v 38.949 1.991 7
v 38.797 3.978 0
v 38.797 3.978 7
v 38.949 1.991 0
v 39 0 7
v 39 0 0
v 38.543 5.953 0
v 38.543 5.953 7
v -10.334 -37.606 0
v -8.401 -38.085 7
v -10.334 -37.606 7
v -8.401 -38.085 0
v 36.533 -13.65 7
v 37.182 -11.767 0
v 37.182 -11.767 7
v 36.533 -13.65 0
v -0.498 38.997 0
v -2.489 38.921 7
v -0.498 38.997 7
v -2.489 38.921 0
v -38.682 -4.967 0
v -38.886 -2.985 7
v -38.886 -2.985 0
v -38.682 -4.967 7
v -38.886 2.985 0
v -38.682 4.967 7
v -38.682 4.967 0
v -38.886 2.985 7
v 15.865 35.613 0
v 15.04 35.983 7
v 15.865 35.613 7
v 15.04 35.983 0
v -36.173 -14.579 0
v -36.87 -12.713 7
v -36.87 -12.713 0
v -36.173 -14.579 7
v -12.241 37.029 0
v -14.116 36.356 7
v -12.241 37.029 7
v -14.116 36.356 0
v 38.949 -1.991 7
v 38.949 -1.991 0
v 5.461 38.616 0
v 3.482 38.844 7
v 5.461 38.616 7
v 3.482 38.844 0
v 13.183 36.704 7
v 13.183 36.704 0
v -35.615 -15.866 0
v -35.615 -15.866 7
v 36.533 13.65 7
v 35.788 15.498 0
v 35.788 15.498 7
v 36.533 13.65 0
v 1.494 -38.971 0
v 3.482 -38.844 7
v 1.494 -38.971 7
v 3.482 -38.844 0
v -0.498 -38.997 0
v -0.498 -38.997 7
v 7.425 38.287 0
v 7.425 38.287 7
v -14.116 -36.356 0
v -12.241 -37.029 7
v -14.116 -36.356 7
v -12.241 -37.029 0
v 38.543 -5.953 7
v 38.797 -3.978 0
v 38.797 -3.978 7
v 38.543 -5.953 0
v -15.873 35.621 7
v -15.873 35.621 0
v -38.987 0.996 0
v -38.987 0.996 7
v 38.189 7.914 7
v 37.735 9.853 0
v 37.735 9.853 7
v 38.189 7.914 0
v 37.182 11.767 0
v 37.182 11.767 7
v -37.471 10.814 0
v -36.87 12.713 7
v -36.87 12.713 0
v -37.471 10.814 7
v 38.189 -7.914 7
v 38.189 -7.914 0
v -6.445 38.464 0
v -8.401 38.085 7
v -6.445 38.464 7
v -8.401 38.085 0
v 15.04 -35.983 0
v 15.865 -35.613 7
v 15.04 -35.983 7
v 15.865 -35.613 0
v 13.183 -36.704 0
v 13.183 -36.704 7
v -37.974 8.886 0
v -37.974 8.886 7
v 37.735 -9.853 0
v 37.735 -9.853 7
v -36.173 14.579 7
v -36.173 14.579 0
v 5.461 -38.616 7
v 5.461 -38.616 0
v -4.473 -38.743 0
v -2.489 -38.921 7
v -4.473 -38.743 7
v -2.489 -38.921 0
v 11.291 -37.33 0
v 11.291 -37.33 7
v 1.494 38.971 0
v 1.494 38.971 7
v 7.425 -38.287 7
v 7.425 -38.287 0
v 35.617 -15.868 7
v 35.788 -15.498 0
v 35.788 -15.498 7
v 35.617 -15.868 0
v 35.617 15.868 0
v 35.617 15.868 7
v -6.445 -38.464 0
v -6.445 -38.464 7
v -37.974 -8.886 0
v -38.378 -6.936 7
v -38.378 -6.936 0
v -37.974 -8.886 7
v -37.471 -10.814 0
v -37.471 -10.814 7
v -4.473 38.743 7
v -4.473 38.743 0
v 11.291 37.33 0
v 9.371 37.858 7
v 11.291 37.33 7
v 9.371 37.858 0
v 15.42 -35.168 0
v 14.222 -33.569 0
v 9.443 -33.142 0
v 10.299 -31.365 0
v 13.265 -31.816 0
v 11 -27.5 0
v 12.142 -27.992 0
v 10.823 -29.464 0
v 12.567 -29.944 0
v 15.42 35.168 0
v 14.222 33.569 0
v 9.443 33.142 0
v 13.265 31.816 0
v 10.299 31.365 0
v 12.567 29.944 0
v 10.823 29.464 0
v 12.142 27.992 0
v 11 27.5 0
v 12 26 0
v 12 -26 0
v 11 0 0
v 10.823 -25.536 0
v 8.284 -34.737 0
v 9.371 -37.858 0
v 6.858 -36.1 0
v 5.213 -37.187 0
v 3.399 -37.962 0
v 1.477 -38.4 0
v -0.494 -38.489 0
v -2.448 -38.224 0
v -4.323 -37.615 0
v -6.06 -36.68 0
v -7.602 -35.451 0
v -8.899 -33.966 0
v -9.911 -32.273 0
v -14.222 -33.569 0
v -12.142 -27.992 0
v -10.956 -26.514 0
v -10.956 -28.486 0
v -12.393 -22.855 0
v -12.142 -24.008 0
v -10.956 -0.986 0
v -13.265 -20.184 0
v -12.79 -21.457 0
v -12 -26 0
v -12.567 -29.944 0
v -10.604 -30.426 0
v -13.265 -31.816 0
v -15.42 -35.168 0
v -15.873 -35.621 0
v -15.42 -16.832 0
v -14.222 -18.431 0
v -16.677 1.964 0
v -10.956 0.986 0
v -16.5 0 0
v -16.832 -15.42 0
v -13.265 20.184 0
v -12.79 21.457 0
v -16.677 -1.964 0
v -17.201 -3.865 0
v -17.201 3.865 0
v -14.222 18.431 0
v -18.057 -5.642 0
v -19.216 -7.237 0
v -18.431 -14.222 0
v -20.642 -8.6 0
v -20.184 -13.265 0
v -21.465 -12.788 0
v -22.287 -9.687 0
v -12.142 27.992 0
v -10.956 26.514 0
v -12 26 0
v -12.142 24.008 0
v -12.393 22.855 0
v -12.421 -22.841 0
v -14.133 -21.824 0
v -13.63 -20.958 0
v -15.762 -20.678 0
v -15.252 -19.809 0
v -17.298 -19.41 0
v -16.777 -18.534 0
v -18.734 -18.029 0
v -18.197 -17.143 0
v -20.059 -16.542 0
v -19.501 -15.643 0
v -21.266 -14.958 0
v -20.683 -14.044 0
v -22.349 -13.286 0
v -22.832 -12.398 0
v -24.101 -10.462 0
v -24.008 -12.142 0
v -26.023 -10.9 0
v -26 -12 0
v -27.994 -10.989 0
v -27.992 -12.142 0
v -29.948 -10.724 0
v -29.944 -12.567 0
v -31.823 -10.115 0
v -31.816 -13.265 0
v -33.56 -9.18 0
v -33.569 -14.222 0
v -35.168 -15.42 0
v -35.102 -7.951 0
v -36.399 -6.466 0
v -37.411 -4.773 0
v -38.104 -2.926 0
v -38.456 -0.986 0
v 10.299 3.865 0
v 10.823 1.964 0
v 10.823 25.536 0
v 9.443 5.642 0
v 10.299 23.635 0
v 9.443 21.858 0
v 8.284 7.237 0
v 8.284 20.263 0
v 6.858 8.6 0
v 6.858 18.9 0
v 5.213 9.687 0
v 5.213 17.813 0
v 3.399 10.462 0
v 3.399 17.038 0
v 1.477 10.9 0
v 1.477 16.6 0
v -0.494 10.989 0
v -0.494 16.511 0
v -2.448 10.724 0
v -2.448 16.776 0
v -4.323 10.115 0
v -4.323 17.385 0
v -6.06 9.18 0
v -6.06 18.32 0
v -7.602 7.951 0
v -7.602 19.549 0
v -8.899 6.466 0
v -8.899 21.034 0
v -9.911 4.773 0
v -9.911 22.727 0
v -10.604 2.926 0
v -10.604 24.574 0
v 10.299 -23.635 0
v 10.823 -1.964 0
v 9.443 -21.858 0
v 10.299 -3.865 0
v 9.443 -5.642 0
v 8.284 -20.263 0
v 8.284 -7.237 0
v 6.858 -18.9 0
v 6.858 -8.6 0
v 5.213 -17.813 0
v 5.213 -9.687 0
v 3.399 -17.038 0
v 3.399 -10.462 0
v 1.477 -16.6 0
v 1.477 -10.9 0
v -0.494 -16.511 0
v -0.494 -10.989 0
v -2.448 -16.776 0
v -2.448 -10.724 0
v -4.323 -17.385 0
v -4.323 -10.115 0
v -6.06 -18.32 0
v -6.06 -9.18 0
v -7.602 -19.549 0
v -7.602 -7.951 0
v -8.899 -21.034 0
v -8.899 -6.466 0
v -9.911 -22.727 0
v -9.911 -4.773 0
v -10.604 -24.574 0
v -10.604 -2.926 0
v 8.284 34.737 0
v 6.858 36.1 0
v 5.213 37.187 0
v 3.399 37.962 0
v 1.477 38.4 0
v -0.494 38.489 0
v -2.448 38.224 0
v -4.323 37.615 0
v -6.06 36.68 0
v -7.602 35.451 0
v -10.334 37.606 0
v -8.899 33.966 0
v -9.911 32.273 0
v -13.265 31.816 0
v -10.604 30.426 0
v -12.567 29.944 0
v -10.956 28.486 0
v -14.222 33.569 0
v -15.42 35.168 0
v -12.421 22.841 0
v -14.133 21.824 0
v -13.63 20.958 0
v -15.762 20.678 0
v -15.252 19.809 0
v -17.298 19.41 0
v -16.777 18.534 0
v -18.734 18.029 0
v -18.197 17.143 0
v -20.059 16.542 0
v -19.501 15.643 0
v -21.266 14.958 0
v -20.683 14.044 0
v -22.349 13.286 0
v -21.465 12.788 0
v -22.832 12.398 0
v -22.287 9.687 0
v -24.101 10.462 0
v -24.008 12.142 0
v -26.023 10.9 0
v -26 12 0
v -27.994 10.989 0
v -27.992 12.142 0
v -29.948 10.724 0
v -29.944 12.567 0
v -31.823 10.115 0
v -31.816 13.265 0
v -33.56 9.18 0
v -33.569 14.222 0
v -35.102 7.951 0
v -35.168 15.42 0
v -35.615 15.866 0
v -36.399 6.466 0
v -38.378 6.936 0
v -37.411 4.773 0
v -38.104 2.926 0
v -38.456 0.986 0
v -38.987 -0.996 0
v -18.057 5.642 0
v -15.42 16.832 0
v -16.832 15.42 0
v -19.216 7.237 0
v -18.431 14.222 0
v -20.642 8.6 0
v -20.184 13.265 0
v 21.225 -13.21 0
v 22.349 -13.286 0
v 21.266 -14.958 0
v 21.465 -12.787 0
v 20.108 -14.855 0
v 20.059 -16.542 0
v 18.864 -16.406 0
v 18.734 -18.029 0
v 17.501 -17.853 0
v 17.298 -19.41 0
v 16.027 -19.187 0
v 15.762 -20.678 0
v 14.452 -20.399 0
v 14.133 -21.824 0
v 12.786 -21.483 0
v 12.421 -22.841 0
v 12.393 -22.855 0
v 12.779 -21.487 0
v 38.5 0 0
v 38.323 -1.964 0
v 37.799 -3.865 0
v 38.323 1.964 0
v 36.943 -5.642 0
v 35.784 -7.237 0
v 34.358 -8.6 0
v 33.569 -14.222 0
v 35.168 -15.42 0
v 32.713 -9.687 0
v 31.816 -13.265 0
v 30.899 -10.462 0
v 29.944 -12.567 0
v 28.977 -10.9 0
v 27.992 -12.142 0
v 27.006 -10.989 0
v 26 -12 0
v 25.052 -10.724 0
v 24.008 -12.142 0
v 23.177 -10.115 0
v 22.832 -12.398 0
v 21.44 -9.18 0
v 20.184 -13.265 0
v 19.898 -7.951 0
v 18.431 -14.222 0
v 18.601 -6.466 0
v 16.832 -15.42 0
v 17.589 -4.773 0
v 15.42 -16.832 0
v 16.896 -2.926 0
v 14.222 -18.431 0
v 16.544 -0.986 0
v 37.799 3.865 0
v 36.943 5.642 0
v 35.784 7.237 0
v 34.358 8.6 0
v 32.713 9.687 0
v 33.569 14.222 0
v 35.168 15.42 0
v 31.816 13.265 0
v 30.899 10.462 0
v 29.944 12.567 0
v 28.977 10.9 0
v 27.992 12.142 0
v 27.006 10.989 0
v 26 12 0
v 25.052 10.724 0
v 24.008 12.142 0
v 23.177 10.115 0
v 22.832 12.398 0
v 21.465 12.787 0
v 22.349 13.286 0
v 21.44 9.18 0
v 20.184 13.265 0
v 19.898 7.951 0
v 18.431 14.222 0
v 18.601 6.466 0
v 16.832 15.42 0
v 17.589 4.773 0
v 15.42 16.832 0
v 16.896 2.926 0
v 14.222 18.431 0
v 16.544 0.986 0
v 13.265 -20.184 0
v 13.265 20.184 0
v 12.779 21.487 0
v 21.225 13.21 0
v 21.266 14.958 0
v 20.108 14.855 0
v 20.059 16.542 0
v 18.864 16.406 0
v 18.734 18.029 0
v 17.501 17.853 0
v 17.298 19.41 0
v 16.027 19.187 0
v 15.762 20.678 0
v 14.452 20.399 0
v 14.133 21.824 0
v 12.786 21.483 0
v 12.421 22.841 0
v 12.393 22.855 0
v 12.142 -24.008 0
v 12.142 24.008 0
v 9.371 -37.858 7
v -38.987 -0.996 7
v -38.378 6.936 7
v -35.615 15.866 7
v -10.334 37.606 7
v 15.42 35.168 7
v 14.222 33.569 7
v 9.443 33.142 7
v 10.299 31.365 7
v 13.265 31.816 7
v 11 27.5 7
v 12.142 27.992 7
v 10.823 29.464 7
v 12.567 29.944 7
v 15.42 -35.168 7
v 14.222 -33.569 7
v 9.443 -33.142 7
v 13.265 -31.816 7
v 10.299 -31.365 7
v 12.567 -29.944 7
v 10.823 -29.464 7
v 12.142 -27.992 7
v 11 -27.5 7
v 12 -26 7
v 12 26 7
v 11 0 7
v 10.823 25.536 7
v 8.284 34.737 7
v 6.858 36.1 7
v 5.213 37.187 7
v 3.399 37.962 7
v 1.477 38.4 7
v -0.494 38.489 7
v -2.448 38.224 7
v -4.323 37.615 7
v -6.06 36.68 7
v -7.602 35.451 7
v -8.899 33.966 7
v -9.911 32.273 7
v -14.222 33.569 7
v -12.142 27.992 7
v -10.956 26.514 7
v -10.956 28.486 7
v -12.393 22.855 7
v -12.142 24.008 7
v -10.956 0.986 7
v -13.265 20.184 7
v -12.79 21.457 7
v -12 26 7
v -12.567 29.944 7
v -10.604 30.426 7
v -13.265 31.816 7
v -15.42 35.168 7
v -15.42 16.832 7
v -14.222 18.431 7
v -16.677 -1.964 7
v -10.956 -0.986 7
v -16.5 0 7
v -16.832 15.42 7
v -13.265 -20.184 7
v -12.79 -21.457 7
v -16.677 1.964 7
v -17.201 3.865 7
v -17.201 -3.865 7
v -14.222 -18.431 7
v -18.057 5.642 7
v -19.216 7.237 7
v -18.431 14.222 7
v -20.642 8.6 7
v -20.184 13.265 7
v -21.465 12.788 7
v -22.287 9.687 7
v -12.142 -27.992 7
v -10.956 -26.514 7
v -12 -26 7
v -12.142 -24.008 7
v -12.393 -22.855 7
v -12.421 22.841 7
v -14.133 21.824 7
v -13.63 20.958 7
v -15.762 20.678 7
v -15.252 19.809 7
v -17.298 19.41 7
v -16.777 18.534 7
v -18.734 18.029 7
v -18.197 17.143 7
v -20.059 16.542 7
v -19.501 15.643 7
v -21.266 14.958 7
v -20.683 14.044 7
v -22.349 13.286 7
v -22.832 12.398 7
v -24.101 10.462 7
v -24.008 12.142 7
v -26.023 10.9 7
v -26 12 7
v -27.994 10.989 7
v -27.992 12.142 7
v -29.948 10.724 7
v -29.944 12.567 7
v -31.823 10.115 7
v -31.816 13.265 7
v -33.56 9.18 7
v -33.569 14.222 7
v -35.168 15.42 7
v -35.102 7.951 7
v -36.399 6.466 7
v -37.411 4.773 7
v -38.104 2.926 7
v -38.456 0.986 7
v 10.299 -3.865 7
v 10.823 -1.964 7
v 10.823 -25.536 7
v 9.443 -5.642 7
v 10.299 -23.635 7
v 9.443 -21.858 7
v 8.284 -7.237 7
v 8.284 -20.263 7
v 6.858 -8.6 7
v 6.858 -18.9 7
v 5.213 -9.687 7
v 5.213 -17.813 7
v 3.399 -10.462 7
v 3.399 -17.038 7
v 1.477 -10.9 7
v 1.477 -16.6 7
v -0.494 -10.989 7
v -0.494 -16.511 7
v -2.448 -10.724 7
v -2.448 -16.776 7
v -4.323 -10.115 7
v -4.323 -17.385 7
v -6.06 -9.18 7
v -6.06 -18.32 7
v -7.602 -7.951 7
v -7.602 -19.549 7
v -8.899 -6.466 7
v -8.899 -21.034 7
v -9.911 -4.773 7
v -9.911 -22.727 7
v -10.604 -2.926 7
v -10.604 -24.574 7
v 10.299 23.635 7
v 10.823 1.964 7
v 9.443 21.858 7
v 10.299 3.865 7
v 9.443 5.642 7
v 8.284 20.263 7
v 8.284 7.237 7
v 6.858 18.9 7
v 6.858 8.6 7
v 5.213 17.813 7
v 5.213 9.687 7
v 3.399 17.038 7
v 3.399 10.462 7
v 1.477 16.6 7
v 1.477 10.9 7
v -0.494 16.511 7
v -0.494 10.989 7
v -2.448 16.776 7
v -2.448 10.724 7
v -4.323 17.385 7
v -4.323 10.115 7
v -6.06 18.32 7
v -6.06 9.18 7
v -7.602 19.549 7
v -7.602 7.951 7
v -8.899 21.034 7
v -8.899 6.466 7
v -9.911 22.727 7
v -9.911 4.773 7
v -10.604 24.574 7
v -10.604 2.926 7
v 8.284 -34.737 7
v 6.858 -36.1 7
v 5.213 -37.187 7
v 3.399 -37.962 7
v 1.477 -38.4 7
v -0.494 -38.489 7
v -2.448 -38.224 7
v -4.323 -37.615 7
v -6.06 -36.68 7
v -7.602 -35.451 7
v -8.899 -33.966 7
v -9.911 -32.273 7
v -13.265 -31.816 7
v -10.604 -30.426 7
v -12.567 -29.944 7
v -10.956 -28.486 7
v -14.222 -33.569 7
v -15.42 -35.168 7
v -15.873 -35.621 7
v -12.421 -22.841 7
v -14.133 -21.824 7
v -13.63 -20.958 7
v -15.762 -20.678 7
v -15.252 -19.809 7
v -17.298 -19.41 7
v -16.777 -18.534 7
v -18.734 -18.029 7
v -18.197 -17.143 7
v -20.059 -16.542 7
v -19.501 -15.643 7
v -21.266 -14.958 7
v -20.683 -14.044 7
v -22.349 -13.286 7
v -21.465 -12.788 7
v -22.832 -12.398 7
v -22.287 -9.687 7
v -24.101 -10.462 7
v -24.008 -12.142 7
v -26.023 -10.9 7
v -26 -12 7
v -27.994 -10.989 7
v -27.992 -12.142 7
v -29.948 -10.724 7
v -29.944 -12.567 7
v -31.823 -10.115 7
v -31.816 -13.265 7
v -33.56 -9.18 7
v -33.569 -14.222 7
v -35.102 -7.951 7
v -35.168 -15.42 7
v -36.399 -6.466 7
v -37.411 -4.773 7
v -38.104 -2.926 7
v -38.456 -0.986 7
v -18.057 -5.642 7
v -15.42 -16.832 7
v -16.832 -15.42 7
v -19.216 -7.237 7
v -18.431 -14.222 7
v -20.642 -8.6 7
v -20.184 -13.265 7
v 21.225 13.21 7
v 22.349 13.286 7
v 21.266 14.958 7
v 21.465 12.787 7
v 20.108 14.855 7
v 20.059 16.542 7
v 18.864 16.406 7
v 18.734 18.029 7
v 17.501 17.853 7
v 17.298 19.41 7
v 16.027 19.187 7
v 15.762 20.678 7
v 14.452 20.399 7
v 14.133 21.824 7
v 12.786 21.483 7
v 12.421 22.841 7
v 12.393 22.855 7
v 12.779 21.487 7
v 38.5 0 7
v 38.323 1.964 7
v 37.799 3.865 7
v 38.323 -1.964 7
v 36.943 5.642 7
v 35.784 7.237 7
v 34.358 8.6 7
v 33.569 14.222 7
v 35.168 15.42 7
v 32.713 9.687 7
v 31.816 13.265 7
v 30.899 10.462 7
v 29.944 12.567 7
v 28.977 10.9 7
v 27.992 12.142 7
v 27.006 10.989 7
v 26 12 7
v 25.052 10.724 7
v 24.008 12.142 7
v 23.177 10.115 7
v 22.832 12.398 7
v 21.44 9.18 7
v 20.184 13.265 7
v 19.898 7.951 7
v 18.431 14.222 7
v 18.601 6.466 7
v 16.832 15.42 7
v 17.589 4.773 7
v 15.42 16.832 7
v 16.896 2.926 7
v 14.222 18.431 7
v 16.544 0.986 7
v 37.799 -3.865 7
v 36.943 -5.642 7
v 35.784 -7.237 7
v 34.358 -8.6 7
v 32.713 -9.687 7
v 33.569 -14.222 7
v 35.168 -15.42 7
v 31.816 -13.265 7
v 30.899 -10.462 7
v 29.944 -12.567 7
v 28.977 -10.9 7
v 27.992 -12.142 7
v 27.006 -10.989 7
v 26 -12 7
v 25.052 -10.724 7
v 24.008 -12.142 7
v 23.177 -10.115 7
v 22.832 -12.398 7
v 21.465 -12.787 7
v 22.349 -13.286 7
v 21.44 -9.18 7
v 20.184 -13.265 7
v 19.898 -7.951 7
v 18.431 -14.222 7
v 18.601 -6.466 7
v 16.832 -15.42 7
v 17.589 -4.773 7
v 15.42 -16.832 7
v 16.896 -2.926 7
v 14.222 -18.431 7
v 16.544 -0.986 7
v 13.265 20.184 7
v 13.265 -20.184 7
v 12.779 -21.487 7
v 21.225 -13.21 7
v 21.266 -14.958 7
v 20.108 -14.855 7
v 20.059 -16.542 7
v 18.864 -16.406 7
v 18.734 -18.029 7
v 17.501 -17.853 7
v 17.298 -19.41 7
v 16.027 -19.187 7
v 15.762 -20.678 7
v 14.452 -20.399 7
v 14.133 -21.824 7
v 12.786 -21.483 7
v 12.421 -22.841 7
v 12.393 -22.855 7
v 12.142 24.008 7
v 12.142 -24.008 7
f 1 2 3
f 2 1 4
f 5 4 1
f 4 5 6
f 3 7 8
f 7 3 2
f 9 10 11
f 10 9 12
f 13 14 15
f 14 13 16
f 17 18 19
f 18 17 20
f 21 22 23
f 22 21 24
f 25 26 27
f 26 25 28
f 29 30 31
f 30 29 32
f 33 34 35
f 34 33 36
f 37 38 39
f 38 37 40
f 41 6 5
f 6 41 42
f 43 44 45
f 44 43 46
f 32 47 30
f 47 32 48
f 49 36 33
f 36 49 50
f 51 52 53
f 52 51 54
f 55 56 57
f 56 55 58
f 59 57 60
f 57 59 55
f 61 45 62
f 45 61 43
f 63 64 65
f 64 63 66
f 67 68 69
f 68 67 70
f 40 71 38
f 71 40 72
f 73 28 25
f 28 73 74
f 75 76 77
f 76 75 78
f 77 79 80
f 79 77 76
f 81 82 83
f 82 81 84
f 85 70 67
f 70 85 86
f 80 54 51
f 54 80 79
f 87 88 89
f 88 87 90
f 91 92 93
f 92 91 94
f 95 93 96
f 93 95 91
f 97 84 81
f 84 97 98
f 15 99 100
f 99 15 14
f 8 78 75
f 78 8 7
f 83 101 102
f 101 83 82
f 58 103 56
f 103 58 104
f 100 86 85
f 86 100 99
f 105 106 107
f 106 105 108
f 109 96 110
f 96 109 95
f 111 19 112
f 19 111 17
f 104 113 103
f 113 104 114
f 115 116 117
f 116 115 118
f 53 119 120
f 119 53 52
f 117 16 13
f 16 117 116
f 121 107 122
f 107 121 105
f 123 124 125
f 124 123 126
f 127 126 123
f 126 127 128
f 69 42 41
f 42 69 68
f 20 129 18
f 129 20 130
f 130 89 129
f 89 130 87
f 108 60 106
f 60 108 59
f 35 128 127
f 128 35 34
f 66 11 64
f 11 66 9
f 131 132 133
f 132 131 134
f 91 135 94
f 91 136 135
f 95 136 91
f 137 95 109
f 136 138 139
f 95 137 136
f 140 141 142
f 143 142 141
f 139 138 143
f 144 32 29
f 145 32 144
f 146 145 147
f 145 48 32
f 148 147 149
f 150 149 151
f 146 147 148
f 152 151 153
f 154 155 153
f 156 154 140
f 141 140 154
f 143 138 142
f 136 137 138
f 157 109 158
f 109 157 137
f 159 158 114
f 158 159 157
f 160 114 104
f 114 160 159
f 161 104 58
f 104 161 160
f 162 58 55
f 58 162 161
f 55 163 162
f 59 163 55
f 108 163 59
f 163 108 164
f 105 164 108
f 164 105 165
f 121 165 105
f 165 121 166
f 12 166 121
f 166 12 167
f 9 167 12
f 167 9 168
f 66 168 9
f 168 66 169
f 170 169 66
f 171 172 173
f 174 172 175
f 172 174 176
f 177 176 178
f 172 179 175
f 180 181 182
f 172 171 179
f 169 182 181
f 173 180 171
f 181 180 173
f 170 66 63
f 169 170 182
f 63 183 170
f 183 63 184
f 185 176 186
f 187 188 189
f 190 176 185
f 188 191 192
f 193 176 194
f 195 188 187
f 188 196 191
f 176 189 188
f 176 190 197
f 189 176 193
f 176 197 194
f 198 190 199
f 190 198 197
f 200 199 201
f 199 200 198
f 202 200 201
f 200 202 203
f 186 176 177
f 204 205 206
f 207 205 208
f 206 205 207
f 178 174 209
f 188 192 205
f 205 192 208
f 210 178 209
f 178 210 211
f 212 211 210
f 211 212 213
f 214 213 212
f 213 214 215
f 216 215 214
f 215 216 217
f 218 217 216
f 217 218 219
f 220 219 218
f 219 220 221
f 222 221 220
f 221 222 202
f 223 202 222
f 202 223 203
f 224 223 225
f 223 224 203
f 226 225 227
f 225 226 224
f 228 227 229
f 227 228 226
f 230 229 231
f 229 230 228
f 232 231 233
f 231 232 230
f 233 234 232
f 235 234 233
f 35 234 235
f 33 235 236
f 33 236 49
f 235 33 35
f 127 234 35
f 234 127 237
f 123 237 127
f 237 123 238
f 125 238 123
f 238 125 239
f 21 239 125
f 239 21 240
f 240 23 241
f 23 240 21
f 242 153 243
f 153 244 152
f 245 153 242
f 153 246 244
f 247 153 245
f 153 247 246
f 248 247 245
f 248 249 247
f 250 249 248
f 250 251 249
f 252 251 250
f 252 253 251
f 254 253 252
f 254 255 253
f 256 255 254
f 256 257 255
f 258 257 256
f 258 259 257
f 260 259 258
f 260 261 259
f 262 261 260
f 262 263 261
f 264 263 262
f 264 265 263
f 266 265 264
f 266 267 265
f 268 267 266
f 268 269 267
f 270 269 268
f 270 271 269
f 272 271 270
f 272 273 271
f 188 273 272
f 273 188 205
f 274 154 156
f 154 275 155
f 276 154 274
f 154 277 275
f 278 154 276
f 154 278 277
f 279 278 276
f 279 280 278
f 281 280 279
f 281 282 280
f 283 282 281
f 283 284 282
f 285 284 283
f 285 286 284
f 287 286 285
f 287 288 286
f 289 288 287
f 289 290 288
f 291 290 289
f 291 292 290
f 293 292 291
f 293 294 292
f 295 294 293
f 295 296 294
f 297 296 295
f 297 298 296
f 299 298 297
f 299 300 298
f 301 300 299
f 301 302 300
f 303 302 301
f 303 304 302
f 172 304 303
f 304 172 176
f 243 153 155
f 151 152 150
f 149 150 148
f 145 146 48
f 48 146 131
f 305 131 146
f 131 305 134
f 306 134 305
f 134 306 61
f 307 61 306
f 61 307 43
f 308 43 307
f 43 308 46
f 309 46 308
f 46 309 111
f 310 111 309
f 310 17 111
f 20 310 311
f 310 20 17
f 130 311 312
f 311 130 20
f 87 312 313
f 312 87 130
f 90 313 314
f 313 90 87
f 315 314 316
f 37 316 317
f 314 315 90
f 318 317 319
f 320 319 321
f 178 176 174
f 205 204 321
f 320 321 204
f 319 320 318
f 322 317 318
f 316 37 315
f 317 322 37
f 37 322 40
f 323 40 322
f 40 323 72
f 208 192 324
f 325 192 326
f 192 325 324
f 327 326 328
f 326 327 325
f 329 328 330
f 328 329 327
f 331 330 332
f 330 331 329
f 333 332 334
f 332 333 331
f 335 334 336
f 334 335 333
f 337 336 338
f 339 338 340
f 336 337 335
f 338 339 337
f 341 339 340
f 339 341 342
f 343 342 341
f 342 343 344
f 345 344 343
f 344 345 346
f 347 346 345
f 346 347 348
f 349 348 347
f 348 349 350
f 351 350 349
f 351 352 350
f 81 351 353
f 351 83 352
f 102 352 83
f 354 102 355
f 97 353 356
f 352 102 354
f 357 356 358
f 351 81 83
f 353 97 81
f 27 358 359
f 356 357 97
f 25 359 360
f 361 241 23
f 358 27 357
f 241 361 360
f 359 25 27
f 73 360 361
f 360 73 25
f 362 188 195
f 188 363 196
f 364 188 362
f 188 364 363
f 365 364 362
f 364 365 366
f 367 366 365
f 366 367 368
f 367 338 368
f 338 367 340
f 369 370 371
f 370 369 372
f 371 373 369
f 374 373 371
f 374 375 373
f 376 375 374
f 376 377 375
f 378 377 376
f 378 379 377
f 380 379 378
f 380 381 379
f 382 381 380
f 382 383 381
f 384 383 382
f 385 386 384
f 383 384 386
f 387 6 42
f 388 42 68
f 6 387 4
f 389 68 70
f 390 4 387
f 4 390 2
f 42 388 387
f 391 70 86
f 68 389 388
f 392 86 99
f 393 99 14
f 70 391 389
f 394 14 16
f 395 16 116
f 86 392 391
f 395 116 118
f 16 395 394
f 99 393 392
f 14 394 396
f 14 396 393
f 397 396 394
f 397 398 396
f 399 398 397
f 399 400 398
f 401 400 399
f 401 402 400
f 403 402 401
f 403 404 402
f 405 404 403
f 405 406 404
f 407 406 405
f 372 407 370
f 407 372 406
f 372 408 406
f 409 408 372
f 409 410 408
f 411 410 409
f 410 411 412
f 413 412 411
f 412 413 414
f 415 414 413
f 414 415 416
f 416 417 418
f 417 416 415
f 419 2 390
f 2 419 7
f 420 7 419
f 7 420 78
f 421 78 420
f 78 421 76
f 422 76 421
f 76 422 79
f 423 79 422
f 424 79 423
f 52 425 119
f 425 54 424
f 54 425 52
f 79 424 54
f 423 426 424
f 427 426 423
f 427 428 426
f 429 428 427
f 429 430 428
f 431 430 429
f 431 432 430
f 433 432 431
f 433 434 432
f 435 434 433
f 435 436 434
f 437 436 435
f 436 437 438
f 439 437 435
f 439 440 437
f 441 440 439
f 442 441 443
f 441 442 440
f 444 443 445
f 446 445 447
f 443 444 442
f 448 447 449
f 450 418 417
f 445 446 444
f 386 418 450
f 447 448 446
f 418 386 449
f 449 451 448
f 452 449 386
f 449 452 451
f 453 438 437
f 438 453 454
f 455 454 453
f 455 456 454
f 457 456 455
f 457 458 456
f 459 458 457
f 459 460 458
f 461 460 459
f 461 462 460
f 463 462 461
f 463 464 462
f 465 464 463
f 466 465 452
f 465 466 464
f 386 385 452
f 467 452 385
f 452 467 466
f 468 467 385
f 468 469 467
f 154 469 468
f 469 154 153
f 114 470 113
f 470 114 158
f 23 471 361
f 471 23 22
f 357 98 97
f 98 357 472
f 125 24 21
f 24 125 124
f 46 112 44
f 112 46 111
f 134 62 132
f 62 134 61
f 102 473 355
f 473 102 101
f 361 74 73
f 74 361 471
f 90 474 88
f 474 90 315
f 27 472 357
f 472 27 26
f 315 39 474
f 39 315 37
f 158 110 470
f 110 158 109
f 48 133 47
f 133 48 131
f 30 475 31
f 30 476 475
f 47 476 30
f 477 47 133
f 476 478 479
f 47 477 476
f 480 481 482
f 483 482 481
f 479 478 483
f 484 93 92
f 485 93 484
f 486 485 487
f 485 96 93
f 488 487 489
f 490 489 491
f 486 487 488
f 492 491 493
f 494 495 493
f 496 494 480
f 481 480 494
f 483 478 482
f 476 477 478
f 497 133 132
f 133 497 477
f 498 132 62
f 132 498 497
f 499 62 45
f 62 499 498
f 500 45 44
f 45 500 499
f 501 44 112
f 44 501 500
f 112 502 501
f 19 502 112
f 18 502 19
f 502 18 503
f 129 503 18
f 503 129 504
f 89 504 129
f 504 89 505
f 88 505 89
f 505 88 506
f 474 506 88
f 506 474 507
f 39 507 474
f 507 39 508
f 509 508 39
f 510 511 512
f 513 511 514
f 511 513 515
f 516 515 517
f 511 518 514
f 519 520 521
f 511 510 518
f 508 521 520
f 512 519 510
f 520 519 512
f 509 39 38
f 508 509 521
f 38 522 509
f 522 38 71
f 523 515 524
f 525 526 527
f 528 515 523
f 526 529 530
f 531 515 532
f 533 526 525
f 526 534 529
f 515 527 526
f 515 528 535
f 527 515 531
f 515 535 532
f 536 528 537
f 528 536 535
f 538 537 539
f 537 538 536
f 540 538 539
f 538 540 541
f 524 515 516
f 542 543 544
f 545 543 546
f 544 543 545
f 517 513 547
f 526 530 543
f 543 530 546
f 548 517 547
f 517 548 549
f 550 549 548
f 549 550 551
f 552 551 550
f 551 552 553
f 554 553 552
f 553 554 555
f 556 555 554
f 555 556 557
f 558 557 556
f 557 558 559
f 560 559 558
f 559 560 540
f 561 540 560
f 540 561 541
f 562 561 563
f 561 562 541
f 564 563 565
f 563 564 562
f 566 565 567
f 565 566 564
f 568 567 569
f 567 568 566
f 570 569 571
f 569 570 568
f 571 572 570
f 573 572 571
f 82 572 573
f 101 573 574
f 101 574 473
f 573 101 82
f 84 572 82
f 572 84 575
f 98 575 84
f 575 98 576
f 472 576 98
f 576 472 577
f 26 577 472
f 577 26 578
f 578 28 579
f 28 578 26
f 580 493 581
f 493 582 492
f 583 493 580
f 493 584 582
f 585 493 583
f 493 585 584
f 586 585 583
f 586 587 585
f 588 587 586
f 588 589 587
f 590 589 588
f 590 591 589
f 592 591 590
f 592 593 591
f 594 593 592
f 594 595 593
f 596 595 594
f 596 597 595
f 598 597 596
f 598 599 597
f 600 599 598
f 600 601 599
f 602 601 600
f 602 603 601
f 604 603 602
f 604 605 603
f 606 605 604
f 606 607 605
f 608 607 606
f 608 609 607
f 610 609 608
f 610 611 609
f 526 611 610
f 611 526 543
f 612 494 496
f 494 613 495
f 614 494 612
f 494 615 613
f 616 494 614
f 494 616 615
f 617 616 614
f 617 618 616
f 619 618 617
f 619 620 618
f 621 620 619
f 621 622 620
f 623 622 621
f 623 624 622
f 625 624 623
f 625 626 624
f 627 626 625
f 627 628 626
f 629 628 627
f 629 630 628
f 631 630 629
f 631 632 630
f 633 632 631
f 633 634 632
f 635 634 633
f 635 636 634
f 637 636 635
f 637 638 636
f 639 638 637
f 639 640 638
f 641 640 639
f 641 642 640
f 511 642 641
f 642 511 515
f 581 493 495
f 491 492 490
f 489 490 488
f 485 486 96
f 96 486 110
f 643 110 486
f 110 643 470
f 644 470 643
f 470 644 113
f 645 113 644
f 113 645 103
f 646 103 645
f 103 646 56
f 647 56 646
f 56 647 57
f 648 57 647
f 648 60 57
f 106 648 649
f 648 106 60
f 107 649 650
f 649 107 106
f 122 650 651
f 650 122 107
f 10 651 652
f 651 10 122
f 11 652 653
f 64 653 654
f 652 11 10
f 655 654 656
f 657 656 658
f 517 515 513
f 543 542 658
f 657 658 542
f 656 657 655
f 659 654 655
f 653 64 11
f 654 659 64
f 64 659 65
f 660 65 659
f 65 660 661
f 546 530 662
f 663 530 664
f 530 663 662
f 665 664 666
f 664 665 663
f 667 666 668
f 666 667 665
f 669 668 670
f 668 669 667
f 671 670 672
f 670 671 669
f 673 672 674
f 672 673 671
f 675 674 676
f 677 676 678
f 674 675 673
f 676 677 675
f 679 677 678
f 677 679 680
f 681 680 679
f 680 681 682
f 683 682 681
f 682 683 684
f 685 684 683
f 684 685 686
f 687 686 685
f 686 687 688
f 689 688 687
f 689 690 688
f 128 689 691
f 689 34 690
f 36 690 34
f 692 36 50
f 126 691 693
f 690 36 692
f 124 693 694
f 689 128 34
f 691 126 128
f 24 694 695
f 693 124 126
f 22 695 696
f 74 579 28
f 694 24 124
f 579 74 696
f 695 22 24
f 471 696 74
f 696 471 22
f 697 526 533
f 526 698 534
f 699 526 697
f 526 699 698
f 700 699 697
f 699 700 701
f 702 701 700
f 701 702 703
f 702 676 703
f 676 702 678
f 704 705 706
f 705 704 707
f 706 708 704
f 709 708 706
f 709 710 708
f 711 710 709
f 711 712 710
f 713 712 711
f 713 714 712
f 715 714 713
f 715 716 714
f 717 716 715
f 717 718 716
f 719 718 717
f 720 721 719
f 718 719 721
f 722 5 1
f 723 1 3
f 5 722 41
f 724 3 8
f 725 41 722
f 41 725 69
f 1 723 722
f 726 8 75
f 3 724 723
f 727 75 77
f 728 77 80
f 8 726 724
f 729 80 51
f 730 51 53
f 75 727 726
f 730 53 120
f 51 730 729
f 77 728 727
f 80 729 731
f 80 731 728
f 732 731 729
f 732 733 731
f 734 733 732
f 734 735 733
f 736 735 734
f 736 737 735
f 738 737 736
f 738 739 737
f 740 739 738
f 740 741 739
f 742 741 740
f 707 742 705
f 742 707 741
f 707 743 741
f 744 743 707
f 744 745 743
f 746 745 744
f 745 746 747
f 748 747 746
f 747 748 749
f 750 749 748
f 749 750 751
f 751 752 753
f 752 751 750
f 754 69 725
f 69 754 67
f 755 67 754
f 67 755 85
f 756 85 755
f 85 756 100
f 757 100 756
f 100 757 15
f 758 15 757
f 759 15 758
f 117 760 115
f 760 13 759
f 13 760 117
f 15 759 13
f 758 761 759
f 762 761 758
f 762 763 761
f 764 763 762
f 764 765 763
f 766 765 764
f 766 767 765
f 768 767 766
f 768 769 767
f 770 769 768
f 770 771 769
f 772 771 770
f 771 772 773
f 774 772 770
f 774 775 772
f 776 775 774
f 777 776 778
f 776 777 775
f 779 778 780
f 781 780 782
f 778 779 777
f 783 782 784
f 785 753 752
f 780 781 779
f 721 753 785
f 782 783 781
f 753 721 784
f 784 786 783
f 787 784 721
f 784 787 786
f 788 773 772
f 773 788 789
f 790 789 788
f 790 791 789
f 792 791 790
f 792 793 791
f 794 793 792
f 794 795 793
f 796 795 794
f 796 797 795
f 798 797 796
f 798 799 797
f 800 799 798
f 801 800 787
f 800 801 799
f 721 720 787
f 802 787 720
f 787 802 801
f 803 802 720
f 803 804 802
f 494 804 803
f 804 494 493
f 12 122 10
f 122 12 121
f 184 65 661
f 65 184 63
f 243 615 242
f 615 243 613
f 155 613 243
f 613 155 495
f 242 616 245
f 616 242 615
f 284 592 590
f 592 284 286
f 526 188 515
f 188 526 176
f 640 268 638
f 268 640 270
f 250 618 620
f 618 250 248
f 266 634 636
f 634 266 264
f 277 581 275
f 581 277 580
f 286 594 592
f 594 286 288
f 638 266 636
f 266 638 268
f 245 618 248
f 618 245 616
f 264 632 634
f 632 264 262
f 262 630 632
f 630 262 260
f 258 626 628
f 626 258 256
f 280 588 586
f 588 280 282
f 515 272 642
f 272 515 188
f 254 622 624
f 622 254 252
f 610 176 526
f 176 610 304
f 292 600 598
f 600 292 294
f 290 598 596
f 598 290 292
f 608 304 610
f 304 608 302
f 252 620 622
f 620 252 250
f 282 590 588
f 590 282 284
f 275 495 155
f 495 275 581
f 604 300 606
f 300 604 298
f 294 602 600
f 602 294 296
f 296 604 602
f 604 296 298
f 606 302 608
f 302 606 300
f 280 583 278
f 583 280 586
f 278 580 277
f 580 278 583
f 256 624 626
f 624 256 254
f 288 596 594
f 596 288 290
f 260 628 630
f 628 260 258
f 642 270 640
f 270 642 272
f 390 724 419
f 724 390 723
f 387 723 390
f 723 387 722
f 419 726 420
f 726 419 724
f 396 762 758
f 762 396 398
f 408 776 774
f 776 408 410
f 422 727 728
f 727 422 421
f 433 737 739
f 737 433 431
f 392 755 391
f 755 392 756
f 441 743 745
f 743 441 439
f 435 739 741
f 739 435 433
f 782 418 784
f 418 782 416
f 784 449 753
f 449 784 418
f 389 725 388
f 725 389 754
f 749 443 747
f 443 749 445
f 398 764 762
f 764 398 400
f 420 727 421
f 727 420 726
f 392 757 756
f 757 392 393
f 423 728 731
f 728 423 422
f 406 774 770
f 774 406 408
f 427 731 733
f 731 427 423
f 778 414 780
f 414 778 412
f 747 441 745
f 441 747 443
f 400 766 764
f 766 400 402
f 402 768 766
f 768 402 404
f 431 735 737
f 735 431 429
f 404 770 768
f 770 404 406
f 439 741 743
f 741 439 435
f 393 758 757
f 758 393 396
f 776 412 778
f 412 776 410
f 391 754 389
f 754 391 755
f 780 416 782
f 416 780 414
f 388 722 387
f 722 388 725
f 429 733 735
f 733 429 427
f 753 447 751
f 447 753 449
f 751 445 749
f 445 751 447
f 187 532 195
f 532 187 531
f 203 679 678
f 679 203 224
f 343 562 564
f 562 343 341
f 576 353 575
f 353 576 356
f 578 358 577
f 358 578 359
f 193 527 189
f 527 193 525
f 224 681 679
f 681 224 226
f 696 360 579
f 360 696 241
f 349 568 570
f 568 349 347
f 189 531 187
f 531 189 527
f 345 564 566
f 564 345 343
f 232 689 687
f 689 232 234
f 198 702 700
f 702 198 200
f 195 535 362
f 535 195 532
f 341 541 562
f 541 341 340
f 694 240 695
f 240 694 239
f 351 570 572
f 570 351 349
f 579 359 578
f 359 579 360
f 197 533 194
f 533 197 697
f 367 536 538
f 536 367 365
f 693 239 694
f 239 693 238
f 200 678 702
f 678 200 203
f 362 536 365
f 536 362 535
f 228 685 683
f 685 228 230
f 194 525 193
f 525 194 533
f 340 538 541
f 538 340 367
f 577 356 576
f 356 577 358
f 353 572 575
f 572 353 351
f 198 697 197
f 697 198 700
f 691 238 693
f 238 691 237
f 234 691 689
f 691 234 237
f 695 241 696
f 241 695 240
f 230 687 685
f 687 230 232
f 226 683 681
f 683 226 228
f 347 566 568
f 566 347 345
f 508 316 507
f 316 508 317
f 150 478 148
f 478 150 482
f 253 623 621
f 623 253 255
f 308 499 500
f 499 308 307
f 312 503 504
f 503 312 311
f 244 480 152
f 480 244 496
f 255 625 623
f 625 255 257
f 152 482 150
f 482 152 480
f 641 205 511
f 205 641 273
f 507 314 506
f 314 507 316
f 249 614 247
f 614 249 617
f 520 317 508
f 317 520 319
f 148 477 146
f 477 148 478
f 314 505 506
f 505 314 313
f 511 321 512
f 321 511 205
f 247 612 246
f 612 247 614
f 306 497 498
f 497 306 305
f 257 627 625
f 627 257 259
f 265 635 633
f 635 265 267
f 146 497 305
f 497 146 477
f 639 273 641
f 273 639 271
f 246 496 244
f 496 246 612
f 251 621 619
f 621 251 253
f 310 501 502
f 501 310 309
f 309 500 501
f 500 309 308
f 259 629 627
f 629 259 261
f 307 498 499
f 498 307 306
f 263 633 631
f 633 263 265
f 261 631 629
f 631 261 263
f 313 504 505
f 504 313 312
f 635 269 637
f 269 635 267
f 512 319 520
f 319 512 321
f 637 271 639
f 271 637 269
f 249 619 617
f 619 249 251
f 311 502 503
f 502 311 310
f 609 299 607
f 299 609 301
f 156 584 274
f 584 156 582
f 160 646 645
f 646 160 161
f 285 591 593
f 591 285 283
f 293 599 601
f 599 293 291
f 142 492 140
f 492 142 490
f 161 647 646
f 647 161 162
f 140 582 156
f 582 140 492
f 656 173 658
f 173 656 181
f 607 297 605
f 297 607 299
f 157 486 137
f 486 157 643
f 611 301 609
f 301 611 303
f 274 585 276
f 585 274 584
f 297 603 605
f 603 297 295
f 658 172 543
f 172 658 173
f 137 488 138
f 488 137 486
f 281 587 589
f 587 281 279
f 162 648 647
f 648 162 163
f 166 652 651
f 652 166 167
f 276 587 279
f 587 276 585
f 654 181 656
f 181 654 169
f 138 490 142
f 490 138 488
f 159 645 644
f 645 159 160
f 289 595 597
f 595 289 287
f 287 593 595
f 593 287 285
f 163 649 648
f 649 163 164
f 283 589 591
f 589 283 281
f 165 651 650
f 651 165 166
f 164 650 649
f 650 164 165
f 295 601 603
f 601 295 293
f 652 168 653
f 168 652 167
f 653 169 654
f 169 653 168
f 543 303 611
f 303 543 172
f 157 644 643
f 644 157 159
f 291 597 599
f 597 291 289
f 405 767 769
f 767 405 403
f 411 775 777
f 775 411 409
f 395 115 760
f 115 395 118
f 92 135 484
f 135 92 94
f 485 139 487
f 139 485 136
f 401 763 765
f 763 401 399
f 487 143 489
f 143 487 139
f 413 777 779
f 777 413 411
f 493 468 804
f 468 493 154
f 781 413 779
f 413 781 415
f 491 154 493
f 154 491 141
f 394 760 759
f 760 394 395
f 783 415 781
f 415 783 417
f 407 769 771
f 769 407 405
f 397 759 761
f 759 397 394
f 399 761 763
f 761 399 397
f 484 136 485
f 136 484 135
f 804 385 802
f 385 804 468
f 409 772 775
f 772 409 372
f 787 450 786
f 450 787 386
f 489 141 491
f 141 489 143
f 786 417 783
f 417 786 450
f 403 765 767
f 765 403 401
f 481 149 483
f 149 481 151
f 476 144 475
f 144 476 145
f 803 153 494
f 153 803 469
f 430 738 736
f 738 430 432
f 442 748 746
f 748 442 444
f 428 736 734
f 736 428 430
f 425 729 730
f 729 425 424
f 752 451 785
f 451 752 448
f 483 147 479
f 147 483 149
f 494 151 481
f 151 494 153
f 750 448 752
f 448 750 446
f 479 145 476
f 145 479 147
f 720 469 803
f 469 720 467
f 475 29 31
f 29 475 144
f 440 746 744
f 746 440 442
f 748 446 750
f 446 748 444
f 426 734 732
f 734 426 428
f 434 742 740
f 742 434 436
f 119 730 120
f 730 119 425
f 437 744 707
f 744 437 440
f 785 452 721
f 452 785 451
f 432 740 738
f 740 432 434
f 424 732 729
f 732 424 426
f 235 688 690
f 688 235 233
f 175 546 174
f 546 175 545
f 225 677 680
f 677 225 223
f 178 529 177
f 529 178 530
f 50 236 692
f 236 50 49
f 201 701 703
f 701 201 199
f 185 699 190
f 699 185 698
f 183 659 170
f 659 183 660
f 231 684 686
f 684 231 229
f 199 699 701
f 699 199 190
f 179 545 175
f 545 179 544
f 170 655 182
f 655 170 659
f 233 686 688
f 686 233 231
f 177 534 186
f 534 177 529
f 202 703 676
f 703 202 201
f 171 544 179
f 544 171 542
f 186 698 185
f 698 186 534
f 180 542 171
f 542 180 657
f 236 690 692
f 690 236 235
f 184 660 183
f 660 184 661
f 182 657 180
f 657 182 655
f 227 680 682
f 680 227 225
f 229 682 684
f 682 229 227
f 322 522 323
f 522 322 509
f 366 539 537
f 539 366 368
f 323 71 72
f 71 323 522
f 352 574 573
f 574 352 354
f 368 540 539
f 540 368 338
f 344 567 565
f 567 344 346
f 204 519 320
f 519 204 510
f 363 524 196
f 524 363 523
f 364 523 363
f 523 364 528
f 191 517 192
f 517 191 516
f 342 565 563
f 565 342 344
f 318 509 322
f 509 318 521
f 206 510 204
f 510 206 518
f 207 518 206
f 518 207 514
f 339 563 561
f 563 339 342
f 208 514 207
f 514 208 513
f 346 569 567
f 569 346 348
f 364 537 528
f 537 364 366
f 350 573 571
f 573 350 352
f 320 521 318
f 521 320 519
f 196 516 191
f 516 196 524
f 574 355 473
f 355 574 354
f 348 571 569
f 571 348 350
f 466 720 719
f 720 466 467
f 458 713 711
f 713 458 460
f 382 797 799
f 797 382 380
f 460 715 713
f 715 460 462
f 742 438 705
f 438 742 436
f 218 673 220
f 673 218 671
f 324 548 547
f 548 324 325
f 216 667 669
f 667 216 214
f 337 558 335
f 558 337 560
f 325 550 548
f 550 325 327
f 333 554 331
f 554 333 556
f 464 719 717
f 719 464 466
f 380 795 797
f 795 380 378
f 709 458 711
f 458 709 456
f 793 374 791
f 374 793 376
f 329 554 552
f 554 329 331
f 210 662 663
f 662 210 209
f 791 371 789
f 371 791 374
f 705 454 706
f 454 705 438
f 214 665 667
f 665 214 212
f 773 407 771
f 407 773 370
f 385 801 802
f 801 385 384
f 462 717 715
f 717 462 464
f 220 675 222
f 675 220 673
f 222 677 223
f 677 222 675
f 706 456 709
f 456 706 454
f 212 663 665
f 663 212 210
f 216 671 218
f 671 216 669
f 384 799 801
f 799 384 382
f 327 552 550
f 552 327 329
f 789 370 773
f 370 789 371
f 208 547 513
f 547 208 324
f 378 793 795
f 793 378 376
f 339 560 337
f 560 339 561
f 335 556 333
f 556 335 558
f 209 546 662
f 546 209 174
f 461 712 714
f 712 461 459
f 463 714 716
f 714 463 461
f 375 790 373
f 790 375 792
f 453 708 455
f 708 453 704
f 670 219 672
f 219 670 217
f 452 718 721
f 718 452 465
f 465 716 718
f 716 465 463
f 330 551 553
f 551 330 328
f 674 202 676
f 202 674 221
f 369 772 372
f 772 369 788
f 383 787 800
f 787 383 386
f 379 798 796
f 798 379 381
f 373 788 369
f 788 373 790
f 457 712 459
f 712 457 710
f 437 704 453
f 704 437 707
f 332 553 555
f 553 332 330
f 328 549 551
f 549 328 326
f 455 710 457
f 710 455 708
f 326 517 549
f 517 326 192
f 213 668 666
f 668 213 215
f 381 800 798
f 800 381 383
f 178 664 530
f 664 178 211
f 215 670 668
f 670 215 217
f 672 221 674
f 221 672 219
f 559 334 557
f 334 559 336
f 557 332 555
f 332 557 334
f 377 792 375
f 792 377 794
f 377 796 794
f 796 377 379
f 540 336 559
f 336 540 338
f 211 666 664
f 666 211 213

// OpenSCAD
$fa = 1;
h = 7;
r1 = 39;
r2 = 11;
separation = 27.5;
r3 = 26;
borderWidth = 1;

union() {

difference() {
    cylinder(h=h, r=r1);
    cylinder(h=h, r=r2);
    
    translate([separation, 0, 0])
    cylinder(h=h, r=r2);
    
    translate([(-1 * separation), 0, 0])
    cylinder(h=h, r=r2);
    
    translate([0, separation, 0])
    cylinder(h=h, r=r2);
    
    translate([0, (-1 * separation), 0])
    cylinder(h=h, r=r2);
    
    translate([26, -26, 0])
    cylinder(h=h, r=14);
    
    translate([26, 26, 0])
    cylinder(h=h, r=14);
    
    translate([-26, -26, 0])
    cylinder(h=h, r=14);
    
    translate([-26, 26, 0])
    cylinder(h=h, r=14);
    
}

difference() {

    cylinder(h=h, r=r3);
    cylinder(h=h, r=(r3-borderWidth));
    
    translate([separation, 0, 0])
    cylinder(h=h, r=r2);
    
    translate([-separation, 0, 0])
    cylinder(h=h, r=r2);
    
    translate([0, separation, 0])
    cylinder(h=h, r=r2);
    
    translate([0, -separation, 0])
    cylinder(h=h, r=r2);
    
    
}

}
